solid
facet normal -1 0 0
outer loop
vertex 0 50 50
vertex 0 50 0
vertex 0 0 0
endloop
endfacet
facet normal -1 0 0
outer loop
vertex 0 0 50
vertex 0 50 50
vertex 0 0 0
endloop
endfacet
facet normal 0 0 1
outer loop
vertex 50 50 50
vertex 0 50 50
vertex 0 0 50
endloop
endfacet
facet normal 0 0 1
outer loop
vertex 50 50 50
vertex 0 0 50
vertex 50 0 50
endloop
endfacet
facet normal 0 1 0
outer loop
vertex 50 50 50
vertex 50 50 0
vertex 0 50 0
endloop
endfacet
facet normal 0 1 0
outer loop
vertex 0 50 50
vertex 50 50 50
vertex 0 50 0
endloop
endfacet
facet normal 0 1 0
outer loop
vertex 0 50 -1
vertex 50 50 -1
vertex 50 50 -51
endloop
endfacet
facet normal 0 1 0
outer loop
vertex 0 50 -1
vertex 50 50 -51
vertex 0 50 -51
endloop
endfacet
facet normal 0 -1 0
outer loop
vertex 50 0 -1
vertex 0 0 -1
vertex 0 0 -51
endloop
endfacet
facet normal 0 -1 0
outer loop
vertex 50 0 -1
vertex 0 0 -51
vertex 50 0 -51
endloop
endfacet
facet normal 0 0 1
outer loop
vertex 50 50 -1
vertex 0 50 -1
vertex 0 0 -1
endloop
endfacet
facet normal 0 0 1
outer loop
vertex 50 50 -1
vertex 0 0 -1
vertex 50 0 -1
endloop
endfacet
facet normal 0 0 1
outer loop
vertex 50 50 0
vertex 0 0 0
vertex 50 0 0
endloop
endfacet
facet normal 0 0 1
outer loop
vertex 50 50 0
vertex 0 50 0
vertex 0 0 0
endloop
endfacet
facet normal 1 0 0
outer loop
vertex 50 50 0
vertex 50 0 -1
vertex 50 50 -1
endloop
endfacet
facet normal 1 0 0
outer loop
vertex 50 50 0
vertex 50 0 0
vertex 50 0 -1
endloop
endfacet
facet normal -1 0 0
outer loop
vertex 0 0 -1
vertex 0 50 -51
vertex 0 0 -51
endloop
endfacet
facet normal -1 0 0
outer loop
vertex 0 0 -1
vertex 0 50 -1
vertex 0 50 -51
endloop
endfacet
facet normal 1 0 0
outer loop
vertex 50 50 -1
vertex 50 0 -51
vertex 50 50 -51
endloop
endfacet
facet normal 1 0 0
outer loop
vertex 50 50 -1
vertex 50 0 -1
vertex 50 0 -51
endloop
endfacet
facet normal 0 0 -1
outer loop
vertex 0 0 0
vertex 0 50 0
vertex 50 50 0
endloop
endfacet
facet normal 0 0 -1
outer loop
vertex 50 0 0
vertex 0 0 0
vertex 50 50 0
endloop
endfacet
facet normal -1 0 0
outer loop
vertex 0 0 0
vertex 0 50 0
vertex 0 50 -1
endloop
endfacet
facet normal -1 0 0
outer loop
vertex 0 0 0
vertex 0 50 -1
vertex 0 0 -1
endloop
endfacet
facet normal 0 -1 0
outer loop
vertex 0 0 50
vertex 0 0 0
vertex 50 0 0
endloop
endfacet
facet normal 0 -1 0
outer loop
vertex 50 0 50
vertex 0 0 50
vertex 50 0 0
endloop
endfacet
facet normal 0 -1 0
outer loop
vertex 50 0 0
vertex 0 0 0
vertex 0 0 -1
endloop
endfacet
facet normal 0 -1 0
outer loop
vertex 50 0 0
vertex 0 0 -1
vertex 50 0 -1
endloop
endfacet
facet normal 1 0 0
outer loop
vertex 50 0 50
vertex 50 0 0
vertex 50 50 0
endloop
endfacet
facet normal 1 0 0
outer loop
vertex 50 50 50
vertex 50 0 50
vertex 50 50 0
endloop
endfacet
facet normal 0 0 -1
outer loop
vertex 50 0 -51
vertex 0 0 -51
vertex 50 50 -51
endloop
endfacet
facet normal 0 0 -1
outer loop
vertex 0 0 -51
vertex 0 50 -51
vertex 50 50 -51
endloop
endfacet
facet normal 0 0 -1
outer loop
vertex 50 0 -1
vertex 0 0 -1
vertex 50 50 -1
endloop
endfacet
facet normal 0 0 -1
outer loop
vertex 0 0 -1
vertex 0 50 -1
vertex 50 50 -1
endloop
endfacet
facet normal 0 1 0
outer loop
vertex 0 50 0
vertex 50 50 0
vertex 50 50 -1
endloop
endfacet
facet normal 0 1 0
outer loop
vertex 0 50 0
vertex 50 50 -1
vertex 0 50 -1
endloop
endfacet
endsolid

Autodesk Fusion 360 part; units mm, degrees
sketch "Skizze1" plane through (0, 0, 0) normal (0, 0, 1) x (1, 0, 0)
  line L0 (0, 0) -> (50, 0)
  line L1 (50, 0) -> (50, 50)
  line L2 (50, 50) -> (0, 50)
  line L3 (0, 50) -> (0, 0)
extrude "Extrusion1" add sketch "Skizze1" along normal blind 50 makes body 1
copy_body "Körper->Berechn1" bodies 1 removing the originals makes body 2 in component "Big Stone"
extrude "Extrusion1'" add sketch "Skizze1" against normal blind 1 separate body makes body 3 in component "Ground"
extrude "Extrusion1''" add 1 faces at (16.6667, 33.3333, -1) along direction (0, 0, -1) blind 50 separate body on bodies 3 makes body 4 in component "Ground below"
component "Big Stone" placed x (1, 0, 0) y (0, 1, 0) z (0, 0, 1) at (0, 0, 0)
component "Ground" placed x (1, 0, 0) y (0, 1, 0) z (0, 0, 1) at (0, 0, 0)
component "Ground below" placed x (1, 0, 0) y (0, 1, 0) z (0, 0, 1) at (0, 0, 0)
